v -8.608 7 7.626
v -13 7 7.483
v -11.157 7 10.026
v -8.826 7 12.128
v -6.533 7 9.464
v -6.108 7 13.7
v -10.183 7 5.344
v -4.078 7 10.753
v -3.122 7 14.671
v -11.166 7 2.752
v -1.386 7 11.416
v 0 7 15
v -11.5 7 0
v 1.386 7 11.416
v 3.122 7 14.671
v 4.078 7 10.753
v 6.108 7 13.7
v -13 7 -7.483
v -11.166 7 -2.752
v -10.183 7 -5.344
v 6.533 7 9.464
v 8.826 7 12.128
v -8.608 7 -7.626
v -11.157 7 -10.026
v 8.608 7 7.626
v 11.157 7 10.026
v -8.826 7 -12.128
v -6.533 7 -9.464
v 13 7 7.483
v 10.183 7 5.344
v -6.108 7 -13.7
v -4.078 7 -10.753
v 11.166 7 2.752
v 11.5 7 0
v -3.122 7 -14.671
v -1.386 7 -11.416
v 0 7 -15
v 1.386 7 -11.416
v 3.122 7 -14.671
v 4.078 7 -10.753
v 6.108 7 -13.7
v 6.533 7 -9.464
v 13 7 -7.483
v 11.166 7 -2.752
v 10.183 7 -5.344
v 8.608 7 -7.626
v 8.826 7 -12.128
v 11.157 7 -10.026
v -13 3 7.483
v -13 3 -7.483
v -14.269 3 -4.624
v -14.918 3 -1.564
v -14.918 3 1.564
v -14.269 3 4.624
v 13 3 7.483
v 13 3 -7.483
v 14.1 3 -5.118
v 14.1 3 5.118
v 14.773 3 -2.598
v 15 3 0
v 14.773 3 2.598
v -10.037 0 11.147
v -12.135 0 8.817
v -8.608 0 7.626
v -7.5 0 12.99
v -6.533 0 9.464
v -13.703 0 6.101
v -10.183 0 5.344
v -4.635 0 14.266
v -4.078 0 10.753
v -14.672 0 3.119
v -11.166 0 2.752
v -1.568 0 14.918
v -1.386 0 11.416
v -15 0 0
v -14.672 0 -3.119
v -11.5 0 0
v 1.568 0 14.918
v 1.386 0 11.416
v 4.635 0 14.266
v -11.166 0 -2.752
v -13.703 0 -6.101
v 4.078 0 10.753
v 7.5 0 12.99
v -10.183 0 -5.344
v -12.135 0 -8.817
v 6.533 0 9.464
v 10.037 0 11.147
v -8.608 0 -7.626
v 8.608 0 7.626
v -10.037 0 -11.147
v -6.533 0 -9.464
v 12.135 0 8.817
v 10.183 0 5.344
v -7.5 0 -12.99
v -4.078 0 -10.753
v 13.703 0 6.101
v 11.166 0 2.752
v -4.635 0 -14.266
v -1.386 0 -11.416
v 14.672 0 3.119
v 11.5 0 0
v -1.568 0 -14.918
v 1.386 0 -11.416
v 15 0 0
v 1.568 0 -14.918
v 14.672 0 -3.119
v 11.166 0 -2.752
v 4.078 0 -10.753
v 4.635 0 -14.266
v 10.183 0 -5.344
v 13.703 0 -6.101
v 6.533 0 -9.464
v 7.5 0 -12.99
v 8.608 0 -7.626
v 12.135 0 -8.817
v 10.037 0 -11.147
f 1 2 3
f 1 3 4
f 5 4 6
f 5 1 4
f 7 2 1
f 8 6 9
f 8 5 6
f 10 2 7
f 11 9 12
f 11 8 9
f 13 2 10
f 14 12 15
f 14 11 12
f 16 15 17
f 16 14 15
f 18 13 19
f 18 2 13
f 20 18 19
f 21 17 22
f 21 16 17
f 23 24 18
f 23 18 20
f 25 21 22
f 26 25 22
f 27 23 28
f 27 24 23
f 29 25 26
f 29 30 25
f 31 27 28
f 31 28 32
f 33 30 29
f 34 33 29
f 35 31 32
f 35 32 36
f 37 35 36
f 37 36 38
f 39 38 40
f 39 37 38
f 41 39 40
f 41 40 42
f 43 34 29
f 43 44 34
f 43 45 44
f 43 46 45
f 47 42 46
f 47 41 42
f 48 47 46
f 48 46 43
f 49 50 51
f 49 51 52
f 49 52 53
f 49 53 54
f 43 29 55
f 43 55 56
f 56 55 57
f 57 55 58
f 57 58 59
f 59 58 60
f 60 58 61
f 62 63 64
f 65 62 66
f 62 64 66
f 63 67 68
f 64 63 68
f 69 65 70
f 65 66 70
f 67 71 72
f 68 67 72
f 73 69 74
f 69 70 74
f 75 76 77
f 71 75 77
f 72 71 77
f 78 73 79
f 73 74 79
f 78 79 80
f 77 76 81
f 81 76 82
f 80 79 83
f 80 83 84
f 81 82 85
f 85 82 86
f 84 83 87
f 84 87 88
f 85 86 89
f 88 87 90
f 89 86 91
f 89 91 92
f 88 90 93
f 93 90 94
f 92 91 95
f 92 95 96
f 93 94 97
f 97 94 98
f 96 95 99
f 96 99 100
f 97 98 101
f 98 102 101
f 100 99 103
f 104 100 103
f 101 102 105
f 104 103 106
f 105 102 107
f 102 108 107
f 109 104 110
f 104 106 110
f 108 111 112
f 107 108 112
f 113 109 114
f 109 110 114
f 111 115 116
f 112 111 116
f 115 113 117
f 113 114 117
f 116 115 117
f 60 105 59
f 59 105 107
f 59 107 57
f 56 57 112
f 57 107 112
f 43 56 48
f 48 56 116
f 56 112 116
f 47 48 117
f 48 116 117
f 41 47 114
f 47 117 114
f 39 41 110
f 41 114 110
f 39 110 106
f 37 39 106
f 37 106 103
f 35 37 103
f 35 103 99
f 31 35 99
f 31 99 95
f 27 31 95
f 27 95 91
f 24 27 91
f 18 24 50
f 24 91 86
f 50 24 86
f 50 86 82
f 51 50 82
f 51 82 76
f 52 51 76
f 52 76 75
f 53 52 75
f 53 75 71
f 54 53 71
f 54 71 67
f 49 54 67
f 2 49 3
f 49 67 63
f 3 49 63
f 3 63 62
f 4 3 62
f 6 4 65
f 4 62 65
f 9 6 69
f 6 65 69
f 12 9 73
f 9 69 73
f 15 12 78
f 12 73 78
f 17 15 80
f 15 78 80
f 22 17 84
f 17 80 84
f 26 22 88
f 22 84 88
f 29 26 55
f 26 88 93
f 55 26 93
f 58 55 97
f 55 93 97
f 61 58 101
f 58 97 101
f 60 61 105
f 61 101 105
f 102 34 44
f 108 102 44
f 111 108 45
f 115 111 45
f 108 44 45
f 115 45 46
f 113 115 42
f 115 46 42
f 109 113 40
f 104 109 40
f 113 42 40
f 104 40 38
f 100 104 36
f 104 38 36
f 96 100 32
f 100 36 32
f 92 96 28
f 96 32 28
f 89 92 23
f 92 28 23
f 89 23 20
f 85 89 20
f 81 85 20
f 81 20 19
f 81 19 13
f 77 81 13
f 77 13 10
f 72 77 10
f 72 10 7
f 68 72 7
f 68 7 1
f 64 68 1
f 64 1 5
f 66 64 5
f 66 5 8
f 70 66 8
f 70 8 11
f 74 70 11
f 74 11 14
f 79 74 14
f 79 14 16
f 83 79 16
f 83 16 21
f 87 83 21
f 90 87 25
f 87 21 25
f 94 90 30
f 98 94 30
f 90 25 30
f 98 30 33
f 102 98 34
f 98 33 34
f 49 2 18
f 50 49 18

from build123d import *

# Parameters (mm, degrees)
SKETCH1_R         = 15
BODY_DEPTH        = 7
SKETCH2_R         = 11.5
CENTER_HOLE_DEPTH = 18
SKETCH4_W         = 4
SKETCH4_H         = 18.83157123
HEX_2_DEPTH       = 4


with BuildPart() as part:
    # Sketch1 → Body (new body)
    with BuildSketch(Plane(origin=(0, 0, 0), x_dir=(1, 0, 0), z_dir=(0, 1, 0))):
        Circle(SKETCH1_R)
    extrude(amount=BODY_DEPTH)

    # Sketch2 → Center_hole (cut)
    with BuildSketch(Plane(origin=(0, 7, 0), x_dir=(1, 0, 0), z_dir=(0, 1, 0))):
        Circle(SKETCH2_R)
    extrude(amount=-CENTER_HOLE_DEPTH, mode=Mode.SUBTRACT)

    # Sketch4 → Hex 2 (cut)
    with BuildSketch(Plane(origin=(0, 7, 0), x_dir=(1, 0, 0), z_dir=(0, 1, 0))):
        with Locations((15, 0)):
            Rectangle(SKETCH4_W, SKETCH4_H)
        with Locations((-15, 0)):
            Rectangle(SKETCH4_W, SKETCH4_H)
    extrude(amount=-HEX_2_DEPTH, mode=Mode.SUBTRACT)


solid = part.part
